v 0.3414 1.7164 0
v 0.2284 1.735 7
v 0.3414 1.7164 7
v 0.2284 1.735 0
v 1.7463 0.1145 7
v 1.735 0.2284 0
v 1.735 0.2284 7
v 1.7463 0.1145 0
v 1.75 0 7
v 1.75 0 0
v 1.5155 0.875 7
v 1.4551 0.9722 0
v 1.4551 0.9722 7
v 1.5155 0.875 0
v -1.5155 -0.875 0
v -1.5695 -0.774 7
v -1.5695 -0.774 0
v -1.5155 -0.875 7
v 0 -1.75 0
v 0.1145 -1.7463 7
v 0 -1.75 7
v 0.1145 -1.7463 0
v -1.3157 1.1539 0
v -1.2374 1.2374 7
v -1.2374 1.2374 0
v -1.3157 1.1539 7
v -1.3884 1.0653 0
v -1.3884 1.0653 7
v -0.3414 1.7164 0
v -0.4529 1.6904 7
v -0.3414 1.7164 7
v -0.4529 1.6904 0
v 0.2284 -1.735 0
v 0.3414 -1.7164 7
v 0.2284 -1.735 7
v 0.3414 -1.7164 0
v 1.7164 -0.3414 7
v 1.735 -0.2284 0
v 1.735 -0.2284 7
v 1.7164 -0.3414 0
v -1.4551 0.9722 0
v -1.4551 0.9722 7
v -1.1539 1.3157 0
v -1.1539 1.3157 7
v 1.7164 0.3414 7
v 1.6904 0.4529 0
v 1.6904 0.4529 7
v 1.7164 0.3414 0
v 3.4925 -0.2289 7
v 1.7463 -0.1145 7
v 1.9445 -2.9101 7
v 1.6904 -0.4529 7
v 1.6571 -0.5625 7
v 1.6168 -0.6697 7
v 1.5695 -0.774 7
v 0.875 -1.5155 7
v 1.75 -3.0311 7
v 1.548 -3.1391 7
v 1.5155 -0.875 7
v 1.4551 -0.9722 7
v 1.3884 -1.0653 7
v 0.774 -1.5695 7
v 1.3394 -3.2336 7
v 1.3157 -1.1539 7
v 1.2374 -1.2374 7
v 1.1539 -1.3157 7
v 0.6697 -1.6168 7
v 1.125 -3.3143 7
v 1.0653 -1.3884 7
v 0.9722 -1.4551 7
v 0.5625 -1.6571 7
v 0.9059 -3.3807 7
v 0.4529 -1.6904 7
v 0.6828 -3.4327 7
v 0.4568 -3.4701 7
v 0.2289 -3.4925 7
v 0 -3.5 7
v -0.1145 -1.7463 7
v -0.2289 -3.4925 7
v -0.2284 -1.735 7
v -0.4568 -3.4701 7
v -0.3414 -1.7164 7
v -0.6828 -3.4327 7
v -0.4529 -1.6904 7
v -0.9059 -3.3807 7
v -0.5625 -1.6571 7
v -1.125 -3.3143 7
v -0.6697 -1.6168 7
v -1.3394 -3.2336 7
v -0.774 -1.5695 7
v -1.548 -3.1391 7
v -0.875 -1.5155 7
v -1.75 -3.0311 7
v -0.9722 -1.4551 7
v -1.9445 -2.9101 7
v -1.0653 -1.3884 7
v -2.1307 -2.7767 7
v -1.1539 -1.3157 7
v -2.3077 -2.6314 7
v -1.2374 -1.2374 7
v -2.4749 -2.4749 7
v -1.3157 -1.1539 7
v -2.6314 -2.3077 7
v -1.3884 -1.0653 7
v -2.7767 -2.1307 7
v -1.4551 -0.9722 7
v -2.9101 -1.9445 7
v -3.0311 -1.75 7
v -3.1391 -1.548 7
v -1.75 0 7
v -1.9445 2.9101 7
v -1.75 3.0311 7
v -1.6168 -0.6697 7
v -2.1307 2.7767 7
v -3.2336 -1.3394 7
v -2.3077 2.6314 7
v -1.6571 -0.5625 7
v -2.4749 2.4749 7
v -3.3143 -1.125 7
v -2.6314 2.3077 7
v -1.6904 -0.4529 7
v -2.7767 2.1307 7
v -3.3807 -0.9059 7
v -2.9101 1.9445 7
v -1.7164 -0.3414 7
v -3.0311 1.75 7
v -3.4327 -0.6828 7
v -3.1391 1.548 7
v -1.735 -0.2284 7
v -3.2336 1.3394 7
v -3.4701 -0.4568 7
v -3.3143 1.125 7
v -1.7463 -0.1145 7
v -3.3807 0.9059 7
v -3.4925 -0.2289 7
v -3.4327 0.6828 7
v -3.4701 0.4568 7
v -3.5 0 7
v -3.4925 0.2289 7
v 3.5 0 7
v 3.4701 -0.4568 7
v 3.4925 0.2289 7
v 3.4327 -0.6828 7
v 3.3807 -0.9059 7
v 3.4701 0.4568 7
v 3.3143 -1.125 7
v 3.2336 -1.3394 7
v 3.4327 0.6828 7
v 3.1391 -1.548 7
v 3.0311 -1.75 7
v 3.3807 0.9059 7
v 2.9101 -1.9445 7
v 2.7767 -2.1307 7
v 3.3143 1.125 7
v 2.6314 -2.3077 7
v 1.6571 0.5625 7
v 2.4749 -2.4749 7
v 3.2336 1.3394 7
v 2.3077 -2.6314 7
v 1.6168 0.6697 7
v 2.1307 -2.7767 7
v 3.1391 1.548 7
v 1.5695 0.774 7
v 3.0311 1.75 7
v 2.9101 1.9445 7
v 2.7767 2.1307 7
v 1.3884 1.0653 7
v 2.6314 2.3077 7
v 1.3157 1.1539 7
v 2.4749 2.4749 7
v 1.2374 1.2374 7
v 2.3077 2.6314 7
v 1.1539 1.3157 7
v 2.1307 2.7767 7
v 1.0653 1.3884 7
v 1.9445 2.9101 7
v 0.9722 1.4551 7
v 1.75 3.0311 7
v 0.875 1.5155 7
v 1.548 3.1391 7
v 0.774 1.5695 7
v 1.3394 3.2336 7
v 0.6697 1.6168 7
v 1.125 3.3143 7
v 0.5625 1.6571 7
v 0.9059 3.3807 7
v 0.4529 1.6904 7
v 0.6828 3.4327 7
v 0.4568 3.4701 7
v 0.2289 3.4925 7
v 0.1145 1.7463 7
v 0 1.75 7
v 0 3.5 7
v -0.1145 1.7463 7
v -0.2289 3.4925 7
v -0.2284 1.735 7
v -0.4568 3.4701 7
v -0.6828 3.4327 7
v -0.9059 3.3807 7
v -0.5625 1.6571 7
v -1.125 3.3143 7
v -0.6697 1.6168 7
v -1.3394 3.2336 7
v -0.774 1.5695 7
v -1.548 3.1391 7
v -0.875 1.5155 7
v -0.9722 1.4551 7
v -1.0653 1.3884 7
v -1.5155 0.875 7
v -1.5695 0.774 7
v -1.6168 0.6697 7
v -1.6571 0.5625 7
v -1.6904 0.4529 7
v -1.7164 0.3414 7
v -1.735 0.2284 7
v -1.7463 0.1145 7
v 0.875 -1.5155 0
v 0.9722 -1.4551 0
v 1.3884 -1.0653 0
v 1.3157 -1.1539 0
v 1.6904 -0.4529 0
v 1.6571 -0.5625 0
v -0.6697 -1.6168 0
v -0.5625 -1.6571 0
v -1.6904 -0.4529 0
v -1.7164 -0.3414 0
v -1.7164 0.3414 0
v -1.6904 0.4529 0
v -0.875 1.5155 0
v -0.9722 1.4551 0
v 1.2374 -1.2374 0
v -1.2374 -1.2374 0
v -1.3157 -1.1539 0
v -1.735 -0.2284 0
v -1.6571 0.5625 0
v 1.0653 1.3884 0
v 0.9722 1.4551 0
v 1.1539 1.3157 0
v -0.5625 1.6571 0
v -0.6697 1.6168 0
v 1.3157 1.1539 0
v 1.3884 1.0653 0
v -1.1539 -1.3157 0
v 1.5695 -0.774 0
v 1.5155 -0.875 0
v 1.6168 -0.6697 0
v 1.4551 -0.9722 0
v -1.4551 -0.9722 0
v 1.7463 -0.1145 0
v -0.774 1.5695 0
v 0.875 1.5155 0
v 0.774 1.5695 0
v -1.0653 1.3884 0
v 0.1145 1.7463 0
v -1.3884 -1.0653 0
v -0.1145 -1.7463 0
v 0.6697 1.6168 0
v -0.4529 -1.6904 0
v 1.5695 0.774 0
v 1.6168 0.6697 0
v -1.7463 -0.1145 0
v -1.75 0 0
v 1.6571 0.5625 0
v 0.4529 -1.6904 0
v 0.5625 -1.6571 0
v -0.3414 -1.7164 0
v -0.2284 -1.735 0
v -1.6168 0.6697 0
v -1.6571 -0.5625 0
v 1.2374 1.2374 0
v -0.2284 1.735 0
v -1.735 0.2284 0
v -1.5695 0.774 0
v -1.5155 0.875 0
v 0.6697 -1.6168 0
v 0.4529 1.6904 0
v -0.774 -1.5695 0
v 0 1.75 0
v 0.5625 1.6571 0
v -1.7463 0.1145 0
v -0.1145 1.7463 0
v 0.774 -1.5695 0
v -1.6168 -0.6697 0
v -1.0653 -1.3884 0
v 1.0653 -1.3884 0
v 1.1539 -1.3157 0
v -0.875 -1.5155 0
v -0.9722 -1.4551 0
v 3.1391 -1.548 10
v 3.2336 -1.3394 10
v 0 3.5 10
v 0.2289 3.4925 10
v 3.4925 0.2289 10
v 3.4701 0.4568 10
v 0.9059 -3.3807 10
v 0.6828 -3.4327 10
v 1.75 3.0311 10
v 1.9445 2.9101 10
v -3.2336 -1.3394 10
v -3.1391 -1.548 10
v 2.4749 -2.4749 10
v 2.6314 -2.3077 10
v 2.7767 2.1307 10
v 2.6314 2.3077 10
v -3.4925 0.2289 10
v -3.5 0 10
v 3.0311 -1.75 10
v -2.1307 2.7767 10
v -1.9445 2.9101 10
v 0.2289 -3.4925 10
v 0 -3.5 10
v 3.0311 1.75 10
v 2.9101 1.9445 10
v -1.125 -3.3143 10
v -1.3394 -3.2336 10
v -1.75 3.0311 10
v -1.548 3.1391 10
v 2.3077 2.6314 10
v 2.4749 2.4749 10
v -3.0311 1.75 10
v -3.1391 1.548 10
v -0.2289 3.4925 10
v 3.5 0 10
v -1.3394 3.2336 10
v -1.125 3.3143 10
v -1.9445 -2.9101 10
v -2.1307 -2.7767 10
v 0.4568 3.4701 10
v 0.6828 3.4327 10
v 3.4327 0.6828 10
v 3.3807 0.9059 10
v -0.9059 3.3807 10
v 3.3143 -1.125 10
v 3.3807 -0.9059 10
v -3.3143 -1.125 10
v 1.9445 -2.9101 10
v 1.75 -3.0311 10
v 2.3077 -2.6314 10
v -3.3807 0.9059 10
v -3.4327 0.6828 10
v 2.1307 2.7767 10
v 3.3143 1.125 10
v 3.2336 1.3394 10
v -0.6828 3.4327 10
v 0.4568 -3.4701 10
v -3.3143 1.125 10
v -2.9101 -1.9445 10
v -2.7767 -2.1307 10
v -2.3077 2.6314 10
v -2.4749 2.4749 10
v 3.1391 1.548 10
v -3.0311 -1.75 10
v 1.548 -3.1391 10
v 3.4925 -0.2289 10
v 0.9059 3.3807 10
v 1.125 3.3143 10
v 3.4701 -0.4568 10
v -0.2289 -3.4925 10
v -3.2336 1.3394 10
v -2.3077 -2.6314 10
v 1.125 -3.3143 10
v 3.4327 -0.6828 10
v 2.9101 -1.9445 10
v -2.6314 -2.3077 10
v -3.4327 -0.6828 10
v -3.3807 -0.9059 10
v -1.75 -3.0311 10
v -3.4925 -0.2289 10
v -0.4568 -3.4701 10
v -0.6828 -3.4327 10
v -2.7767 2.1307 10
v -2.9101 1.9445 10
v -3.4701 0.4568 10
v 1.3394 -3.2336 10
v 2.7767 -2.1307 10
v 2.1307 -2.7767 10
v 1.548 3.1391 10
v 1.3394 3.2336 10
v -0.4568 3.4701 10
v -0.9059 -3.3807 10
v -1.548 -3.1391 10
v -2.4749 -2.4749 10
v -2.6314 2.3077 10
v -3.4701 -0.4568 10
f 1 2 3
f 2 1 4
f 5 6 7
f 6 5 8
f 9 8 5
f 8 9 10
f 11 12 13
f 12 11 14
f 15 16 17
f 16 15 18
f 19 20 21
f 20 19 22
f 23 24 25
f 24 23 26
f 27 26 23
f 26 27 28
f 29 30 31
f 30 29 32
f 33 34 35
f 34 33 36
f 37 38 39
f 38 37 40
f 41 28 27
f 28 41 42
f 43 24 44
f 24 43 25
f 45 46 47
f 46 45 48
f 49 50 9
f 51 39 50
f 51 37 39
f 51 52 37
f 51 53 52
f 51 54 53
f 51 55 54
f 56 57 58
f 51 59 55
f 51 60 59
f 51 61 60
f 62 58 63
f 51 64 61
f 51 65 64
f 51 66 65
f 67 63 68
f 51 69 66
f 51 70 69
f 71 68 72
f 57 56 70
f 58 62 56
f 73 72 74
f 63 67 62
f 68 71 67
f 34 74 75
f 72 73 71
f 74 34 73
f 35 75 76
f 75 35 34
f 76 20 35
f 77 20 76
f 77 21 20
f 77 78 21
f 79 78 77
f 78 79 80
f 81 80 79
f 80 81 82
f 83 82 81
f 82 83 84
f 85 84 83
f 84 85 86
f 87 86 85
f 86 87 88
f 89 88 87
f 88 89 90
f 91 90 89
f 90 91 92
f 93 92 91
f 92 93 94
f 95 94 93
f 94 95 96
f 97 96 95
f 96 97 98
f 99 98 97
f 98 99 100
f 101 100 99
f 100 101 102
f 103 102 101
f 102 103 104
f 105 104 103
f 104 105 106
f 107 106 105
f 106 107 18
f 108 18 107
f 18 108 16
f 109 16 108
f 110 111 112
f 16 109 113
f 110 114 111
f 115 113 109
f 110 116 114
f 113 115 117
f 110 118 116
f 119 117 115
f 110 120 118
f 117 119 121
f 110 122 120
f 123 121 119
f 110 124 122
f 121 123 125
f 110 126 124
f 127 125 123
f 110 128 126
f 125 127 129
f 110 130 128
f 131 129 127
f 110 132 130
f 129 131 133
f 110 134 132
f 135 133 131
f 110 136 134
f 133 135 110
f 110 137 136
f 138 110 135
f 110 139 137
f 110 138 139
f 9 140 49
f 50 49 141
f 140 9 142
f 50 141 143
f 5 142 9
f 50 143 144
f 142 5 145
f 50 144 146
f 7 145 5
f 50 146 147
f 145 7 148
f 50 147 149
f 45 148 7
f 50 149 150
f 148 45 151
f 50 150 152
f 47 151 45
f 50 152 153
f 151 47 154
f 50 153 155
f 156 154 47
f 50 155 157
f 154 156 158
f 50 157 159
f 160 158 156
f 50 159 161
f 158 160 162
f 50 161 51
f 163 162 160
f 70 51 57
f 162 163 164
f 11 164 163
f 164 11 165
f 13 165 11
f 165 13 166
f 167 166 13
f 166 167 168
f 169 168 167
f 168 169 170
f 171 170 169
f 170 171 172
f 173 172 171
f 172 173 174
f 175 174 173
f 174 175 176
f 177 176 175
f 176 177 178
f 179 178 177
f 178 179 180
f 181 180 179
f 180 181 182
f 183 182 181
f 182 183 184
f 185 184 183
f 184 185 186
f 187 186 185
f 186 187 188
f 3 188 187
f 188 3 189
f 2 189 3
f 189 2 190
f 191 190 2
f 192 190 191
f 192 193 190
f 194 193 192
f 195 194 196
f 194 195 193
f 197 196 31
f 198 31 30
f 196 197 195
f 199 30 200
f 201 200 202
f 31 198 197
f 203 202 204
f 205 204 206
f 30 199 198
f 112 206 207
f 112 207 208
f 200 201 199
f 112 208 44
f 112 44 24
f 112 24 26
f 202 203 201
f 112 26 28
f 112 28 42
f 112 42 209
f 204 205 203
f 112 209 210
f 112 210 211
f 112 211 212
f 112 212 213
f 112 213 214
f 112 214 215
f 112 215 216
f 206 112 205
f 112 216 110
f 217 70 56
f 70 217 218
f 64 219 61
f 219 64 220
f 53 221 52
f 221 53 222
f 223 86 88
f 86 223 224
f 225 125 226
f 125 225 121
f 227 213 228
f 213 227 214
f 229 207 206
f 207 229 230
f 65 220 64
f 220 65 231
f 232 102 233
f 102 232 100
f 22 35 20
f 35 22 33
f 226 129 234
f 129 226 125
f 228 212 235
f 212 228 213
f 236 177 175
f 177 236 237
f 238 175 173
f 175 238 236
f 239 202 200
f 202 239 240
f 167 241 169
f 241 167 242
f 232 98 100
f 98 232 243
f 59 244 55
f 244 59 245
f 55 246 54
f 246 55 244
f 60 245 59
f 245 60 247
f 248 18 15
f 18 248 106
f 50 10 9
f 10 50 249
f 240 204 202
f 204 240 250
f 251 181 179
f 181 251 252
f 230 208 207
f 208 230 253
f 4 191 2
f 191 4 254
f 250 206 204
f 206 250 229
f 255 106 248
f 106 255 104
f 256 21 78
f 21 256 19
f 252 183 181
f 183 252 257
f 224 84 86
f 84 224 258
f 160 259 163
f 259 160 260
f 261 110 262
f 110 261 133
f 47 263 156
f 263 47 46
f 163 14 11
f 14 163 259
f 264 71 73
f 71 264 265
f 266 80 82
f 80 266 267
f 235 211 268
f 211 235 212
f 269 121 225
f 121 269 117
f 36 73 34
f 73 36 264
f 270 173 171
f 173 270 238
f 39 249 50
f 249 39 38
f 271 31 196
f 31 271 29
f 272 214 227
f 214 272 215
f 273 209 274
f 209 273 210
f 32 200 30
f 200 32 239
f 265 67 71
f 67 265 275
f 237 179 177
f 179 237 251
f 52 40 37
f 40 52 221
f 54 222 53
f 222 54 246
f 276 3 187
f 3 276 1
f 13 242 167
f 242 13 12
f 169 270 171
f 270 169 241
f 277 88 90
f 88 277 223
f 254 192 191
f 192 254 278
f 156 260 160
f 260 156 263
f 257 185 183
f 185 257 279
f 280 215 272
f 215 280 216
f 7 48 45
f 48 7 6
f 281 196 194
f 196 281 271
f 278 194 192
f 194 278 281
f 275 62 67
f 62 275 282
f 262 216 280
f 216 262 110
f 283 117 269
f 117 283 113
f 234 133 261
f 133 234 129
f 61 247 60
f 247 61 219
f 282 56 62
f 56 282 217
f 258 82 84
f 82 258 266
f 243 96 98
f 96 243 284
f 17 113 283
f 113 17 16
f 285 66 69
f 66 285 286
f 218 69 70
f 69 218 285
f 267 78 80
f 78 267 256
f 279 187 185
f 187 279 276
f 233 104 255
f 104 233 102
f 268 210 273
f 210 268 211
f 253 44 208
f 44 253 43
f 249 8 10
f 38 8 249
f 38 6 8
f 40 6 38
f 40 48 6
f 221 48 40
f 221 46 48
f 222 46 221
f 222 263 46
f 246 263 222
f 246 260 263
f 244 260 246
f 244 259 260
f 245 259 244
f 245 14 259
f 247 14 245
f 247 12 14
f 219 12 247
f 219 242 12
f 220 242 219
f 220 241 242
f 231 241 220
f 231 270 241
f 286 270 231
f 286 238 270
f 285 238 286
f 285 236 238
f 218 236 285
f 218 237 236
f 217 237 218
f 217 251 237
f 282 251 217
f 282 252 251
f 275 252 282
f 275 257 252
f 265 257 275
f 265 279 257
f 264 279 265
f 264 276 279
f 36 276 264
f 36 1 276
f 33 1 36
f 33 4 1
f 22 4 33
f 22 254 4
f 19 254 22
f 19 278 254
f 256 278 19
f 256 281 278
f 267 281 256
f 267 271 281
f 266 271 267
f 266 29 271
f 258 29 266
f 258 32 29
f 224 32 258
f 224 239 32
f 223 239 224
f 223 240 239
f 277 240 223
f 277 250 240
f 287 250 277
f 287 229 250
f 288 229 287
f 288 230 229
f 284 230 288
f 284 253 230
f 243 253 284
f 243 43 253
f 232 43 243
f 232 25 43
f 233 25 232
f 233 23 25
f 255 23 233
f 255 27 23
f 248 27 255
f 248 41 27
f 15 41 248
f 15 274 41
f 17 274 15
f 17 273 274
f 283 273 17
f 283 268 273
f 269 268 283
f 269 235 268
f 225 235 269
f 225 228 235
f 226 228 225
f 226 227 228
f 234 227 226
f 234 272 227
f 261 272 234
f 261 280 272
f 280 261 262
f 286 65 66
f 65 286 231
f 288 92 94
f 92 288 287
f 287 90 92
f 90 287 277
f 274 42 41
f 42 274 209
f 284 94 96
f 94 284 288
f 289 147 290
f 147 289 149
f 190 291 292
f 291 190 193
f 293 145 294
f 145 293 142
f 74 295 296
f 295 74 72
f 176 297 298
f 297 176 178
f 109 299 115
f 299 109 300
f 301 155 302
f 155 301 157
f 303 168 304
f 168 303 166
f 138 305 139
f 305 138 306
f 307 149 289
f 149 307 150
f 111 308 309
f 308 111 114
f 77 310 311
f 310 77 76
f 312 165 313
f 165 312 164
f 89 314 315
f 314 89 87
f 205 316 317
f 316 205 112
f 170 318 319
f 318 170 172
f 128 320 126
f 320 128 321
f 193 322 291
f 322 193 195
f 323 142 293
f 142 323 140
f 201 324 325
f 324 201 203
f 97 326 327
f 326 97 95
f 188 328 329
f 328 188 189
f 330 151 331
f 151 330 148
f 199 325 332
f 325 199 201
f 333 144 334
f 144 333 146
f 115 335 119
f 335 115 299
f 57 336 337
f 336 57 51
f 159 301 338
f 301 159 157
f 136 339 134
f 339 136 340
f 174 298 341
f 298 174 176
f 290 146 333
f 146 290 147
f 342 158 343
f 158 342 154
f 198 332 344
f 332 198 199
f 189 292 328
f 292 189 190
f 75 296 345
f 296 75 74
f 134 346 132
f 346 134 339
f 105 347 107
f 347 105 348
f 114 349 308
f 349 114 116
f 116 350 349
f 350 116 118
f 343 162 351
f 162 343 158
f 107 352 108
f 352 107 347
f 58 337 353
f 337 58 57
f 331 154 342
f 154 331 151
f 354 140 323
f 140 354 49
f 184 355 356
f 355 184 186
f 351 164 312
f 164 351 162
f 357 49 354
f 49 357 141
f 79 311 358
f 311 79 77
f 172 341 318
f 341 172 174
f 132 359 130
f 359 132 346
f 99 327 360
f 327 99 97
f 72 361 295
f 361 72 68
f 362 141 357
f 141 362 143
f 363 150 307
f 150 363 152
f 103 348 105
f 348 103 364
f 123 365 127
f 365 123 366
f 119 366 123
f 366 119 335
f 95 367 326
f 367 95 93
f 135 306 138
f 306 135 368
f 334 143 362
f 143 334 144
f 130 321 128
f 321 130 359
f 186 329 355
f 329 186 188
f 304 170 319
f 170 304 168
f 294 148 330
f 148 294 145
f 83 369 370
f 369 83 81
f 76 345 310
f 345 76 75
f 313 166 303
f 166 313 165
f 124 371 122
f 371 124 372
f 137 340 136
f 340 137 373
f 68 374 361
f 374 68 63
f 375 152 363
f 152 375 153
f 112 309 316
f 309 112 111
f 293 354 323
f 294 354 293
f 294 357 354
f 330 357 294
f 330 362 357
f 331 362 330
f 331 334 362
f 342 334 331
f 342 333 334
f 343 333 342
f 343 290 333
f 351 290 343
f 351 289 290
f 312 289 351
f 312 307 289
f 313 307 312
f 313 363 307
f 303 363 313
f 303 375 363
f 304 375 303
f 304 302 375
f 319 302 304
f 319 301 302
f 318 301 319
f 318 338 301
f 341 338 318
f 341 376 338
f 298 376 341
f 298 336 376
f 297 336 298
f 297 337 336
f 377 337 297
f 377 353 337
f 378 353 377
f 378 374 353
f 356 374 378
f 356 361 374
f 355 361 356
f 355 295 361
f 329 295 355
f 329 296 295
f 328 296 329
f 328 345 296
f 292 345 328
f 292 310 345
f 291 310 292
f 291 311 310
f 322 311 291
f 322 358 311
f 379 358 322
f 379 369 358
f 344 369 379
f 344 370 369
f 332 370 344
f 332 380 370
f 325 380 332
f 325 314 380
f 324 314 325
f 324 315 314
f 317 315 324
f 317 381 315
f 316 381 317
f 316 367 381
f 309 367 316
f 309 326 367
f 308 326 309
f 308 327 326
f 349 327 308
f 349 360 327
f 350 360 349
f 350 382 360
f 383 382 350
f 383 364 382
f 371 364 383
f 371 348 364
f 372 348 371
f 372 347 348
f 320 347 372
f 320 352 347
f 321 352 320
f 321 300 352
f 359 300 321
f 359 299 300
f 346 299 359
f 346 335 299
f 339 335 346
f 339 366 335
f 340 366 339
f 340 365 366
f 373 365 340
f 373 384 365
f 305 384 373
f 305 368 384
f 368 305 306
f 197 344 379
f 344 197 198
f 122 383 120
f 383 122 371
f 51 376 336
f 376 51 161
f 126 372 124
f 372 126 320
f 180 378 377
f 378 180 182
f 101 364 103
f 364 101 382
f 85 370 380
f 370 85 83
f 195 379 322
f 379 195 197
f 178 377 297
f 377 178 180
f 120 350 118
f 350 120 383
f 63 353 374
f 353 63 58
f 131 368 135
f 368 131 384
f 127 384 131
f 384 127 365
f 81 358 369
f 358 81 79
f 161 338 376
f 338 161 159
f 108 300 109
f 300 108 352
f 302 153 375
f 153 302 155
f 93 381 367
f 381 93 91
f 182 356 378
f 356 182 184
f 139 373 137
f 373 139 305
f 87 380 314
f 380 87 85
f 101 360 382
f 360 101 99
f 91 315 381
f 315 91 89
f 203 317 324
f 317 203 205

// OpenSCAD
$fn = 96;

shaft_d = 3.5;
head_d  = 7.0;
length  = 10.0;

head_h = 3.0;                 // simple pan head height
shaft_h = max(0.01, length - head_h);

union() {
  // Shaft
  cylinder(d = shaft_d, h = shaft_h);

  // Head
  translate([0, 0, shaft_h])
    cylinder(d = head_d, h = head_h);
}
